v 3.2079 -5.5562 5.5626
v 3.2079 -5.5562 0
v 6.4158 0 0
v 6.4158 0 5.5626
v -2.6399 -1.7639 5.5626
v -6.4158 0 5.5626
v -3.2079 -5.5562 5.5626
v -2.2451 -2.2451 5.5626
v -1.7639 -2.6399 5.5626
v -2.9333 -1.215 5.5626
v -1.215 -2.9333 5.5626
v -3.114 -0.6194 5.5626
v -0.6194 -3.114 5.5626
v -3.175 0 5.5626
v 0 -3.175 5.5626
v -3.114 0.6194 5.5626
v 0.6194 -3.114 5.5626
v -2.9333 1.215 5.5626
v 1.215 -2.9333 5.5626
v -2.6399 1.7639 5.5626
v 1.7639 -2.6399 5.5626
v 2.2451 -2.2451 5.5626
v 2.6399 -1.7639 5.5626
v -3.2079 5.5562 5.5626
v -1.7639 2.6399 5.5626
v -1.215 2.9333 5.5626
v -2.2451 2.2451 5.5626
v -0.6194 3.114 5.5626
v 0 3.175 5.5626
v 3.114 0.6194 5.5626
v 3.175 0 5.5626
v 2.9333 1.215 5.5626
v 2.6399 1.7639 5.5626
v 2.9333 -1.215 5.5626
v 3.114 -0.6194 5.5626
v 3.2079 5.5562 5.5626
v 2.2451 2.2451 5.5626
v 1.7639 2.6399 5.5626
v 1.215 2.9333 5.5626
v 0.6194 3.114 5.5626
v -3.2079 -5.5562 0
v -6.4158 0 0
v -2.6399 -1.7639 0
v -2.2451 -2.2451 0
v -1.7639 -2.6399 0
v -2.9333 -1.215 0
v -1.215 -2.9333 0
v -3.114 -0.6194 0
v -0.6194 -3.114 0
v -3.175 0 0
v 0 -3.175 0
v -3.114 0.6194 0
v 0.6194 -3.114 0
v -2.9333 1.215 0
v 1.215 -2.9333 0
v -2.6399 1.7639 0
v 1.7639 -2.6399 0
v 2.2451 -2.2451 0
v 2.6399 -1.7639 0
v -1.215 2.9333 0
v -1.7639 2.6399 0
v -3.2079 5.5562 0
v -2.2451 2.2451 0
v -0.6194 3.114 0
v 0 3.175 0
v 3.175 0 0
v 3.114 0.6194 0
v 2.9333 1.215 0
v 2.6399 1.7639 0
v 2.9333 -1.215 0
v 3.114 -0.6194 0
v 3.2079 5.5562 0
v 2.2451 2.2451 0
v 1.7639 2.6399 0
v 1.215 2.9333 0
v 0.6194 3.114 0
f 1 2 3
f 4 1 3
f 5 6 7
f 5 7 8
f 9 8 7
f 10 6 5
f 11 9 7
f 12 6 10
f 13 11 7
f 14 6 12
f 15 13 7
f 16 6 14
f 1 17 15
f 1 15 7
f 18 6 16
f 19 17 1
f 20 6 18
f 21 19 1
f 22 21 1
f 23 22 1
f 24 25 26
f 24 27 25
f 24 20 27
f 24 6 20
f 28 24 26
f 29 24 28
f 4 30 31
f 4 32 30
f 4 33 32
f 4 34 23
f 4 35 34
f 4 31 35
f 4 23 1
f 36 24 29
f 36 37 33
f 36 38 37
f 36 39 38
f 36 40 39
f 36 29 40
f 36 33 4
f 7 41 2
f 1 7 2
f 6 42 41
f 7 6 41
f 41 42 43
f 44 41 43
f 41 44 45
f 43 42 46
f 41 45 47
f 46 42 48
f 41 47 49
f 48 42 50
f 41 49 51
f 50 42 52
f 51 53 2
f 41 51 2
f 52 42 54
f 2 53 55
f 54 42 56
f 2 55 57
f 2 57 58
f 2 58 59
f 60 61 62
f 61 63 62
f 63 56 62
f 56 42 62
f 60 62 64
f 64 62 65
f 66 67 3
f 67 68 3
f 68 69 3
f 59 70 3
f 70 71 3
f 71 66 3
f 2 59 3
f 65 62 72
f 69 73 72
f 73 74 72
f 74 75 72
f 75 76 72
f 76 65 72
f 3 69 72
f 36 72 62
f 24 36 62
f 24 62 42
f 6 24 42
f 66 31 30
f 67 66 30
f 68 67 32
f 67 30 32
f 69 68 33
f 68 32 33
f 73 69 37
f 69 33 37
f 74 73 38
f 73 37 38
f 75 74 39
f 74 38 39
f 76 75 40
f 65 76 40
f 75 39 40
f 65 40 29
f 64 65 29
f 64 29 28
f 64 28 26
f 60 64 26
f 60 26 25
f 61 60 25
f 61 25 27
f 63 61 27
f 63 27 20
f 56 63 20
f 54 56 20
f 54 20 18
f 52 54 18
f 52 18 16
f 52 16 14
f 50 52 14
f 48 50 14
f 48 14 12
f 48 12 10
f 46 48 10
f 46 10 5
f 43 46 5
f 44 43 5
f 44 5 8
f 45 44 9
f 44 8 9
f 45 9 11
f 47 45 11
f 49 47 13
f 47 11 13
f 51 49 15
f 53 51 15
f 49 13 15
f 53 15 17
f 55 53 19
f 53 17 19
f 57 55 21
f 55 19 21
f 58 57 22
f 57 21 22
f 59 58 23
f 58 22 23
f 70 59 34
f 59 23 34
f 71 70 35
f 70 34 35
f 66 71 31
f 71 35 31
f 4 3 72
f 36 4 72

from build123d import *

# Parameters (mm, degrees)
F1_DEPTH = 5.5626
F2_R     = 3.175
F3_DEPTH = 6.08933


with BuildPart() as f1:
    # F0 (on Top) → F1 (new body)
    with BuildSketch(Plane.XY):
        Polygon((-3.207902, -5.55625), (3.207902, -5.55625), (6.415805, 0), (3.207902, 5.55625), (-3.207902, 5.55625), (-6.415805, 0), align=None)
    extrude(amount=F1_DEPTH)

    # F2 (on face) → F3 (cut)
    with BuildSketch(Plane.XY.offset(5.5626)):
        Circle(F2_R)
    extrude(amount=-F3_DEPTH, mode=Mode.SUBTRACT)


solid = f1.part
